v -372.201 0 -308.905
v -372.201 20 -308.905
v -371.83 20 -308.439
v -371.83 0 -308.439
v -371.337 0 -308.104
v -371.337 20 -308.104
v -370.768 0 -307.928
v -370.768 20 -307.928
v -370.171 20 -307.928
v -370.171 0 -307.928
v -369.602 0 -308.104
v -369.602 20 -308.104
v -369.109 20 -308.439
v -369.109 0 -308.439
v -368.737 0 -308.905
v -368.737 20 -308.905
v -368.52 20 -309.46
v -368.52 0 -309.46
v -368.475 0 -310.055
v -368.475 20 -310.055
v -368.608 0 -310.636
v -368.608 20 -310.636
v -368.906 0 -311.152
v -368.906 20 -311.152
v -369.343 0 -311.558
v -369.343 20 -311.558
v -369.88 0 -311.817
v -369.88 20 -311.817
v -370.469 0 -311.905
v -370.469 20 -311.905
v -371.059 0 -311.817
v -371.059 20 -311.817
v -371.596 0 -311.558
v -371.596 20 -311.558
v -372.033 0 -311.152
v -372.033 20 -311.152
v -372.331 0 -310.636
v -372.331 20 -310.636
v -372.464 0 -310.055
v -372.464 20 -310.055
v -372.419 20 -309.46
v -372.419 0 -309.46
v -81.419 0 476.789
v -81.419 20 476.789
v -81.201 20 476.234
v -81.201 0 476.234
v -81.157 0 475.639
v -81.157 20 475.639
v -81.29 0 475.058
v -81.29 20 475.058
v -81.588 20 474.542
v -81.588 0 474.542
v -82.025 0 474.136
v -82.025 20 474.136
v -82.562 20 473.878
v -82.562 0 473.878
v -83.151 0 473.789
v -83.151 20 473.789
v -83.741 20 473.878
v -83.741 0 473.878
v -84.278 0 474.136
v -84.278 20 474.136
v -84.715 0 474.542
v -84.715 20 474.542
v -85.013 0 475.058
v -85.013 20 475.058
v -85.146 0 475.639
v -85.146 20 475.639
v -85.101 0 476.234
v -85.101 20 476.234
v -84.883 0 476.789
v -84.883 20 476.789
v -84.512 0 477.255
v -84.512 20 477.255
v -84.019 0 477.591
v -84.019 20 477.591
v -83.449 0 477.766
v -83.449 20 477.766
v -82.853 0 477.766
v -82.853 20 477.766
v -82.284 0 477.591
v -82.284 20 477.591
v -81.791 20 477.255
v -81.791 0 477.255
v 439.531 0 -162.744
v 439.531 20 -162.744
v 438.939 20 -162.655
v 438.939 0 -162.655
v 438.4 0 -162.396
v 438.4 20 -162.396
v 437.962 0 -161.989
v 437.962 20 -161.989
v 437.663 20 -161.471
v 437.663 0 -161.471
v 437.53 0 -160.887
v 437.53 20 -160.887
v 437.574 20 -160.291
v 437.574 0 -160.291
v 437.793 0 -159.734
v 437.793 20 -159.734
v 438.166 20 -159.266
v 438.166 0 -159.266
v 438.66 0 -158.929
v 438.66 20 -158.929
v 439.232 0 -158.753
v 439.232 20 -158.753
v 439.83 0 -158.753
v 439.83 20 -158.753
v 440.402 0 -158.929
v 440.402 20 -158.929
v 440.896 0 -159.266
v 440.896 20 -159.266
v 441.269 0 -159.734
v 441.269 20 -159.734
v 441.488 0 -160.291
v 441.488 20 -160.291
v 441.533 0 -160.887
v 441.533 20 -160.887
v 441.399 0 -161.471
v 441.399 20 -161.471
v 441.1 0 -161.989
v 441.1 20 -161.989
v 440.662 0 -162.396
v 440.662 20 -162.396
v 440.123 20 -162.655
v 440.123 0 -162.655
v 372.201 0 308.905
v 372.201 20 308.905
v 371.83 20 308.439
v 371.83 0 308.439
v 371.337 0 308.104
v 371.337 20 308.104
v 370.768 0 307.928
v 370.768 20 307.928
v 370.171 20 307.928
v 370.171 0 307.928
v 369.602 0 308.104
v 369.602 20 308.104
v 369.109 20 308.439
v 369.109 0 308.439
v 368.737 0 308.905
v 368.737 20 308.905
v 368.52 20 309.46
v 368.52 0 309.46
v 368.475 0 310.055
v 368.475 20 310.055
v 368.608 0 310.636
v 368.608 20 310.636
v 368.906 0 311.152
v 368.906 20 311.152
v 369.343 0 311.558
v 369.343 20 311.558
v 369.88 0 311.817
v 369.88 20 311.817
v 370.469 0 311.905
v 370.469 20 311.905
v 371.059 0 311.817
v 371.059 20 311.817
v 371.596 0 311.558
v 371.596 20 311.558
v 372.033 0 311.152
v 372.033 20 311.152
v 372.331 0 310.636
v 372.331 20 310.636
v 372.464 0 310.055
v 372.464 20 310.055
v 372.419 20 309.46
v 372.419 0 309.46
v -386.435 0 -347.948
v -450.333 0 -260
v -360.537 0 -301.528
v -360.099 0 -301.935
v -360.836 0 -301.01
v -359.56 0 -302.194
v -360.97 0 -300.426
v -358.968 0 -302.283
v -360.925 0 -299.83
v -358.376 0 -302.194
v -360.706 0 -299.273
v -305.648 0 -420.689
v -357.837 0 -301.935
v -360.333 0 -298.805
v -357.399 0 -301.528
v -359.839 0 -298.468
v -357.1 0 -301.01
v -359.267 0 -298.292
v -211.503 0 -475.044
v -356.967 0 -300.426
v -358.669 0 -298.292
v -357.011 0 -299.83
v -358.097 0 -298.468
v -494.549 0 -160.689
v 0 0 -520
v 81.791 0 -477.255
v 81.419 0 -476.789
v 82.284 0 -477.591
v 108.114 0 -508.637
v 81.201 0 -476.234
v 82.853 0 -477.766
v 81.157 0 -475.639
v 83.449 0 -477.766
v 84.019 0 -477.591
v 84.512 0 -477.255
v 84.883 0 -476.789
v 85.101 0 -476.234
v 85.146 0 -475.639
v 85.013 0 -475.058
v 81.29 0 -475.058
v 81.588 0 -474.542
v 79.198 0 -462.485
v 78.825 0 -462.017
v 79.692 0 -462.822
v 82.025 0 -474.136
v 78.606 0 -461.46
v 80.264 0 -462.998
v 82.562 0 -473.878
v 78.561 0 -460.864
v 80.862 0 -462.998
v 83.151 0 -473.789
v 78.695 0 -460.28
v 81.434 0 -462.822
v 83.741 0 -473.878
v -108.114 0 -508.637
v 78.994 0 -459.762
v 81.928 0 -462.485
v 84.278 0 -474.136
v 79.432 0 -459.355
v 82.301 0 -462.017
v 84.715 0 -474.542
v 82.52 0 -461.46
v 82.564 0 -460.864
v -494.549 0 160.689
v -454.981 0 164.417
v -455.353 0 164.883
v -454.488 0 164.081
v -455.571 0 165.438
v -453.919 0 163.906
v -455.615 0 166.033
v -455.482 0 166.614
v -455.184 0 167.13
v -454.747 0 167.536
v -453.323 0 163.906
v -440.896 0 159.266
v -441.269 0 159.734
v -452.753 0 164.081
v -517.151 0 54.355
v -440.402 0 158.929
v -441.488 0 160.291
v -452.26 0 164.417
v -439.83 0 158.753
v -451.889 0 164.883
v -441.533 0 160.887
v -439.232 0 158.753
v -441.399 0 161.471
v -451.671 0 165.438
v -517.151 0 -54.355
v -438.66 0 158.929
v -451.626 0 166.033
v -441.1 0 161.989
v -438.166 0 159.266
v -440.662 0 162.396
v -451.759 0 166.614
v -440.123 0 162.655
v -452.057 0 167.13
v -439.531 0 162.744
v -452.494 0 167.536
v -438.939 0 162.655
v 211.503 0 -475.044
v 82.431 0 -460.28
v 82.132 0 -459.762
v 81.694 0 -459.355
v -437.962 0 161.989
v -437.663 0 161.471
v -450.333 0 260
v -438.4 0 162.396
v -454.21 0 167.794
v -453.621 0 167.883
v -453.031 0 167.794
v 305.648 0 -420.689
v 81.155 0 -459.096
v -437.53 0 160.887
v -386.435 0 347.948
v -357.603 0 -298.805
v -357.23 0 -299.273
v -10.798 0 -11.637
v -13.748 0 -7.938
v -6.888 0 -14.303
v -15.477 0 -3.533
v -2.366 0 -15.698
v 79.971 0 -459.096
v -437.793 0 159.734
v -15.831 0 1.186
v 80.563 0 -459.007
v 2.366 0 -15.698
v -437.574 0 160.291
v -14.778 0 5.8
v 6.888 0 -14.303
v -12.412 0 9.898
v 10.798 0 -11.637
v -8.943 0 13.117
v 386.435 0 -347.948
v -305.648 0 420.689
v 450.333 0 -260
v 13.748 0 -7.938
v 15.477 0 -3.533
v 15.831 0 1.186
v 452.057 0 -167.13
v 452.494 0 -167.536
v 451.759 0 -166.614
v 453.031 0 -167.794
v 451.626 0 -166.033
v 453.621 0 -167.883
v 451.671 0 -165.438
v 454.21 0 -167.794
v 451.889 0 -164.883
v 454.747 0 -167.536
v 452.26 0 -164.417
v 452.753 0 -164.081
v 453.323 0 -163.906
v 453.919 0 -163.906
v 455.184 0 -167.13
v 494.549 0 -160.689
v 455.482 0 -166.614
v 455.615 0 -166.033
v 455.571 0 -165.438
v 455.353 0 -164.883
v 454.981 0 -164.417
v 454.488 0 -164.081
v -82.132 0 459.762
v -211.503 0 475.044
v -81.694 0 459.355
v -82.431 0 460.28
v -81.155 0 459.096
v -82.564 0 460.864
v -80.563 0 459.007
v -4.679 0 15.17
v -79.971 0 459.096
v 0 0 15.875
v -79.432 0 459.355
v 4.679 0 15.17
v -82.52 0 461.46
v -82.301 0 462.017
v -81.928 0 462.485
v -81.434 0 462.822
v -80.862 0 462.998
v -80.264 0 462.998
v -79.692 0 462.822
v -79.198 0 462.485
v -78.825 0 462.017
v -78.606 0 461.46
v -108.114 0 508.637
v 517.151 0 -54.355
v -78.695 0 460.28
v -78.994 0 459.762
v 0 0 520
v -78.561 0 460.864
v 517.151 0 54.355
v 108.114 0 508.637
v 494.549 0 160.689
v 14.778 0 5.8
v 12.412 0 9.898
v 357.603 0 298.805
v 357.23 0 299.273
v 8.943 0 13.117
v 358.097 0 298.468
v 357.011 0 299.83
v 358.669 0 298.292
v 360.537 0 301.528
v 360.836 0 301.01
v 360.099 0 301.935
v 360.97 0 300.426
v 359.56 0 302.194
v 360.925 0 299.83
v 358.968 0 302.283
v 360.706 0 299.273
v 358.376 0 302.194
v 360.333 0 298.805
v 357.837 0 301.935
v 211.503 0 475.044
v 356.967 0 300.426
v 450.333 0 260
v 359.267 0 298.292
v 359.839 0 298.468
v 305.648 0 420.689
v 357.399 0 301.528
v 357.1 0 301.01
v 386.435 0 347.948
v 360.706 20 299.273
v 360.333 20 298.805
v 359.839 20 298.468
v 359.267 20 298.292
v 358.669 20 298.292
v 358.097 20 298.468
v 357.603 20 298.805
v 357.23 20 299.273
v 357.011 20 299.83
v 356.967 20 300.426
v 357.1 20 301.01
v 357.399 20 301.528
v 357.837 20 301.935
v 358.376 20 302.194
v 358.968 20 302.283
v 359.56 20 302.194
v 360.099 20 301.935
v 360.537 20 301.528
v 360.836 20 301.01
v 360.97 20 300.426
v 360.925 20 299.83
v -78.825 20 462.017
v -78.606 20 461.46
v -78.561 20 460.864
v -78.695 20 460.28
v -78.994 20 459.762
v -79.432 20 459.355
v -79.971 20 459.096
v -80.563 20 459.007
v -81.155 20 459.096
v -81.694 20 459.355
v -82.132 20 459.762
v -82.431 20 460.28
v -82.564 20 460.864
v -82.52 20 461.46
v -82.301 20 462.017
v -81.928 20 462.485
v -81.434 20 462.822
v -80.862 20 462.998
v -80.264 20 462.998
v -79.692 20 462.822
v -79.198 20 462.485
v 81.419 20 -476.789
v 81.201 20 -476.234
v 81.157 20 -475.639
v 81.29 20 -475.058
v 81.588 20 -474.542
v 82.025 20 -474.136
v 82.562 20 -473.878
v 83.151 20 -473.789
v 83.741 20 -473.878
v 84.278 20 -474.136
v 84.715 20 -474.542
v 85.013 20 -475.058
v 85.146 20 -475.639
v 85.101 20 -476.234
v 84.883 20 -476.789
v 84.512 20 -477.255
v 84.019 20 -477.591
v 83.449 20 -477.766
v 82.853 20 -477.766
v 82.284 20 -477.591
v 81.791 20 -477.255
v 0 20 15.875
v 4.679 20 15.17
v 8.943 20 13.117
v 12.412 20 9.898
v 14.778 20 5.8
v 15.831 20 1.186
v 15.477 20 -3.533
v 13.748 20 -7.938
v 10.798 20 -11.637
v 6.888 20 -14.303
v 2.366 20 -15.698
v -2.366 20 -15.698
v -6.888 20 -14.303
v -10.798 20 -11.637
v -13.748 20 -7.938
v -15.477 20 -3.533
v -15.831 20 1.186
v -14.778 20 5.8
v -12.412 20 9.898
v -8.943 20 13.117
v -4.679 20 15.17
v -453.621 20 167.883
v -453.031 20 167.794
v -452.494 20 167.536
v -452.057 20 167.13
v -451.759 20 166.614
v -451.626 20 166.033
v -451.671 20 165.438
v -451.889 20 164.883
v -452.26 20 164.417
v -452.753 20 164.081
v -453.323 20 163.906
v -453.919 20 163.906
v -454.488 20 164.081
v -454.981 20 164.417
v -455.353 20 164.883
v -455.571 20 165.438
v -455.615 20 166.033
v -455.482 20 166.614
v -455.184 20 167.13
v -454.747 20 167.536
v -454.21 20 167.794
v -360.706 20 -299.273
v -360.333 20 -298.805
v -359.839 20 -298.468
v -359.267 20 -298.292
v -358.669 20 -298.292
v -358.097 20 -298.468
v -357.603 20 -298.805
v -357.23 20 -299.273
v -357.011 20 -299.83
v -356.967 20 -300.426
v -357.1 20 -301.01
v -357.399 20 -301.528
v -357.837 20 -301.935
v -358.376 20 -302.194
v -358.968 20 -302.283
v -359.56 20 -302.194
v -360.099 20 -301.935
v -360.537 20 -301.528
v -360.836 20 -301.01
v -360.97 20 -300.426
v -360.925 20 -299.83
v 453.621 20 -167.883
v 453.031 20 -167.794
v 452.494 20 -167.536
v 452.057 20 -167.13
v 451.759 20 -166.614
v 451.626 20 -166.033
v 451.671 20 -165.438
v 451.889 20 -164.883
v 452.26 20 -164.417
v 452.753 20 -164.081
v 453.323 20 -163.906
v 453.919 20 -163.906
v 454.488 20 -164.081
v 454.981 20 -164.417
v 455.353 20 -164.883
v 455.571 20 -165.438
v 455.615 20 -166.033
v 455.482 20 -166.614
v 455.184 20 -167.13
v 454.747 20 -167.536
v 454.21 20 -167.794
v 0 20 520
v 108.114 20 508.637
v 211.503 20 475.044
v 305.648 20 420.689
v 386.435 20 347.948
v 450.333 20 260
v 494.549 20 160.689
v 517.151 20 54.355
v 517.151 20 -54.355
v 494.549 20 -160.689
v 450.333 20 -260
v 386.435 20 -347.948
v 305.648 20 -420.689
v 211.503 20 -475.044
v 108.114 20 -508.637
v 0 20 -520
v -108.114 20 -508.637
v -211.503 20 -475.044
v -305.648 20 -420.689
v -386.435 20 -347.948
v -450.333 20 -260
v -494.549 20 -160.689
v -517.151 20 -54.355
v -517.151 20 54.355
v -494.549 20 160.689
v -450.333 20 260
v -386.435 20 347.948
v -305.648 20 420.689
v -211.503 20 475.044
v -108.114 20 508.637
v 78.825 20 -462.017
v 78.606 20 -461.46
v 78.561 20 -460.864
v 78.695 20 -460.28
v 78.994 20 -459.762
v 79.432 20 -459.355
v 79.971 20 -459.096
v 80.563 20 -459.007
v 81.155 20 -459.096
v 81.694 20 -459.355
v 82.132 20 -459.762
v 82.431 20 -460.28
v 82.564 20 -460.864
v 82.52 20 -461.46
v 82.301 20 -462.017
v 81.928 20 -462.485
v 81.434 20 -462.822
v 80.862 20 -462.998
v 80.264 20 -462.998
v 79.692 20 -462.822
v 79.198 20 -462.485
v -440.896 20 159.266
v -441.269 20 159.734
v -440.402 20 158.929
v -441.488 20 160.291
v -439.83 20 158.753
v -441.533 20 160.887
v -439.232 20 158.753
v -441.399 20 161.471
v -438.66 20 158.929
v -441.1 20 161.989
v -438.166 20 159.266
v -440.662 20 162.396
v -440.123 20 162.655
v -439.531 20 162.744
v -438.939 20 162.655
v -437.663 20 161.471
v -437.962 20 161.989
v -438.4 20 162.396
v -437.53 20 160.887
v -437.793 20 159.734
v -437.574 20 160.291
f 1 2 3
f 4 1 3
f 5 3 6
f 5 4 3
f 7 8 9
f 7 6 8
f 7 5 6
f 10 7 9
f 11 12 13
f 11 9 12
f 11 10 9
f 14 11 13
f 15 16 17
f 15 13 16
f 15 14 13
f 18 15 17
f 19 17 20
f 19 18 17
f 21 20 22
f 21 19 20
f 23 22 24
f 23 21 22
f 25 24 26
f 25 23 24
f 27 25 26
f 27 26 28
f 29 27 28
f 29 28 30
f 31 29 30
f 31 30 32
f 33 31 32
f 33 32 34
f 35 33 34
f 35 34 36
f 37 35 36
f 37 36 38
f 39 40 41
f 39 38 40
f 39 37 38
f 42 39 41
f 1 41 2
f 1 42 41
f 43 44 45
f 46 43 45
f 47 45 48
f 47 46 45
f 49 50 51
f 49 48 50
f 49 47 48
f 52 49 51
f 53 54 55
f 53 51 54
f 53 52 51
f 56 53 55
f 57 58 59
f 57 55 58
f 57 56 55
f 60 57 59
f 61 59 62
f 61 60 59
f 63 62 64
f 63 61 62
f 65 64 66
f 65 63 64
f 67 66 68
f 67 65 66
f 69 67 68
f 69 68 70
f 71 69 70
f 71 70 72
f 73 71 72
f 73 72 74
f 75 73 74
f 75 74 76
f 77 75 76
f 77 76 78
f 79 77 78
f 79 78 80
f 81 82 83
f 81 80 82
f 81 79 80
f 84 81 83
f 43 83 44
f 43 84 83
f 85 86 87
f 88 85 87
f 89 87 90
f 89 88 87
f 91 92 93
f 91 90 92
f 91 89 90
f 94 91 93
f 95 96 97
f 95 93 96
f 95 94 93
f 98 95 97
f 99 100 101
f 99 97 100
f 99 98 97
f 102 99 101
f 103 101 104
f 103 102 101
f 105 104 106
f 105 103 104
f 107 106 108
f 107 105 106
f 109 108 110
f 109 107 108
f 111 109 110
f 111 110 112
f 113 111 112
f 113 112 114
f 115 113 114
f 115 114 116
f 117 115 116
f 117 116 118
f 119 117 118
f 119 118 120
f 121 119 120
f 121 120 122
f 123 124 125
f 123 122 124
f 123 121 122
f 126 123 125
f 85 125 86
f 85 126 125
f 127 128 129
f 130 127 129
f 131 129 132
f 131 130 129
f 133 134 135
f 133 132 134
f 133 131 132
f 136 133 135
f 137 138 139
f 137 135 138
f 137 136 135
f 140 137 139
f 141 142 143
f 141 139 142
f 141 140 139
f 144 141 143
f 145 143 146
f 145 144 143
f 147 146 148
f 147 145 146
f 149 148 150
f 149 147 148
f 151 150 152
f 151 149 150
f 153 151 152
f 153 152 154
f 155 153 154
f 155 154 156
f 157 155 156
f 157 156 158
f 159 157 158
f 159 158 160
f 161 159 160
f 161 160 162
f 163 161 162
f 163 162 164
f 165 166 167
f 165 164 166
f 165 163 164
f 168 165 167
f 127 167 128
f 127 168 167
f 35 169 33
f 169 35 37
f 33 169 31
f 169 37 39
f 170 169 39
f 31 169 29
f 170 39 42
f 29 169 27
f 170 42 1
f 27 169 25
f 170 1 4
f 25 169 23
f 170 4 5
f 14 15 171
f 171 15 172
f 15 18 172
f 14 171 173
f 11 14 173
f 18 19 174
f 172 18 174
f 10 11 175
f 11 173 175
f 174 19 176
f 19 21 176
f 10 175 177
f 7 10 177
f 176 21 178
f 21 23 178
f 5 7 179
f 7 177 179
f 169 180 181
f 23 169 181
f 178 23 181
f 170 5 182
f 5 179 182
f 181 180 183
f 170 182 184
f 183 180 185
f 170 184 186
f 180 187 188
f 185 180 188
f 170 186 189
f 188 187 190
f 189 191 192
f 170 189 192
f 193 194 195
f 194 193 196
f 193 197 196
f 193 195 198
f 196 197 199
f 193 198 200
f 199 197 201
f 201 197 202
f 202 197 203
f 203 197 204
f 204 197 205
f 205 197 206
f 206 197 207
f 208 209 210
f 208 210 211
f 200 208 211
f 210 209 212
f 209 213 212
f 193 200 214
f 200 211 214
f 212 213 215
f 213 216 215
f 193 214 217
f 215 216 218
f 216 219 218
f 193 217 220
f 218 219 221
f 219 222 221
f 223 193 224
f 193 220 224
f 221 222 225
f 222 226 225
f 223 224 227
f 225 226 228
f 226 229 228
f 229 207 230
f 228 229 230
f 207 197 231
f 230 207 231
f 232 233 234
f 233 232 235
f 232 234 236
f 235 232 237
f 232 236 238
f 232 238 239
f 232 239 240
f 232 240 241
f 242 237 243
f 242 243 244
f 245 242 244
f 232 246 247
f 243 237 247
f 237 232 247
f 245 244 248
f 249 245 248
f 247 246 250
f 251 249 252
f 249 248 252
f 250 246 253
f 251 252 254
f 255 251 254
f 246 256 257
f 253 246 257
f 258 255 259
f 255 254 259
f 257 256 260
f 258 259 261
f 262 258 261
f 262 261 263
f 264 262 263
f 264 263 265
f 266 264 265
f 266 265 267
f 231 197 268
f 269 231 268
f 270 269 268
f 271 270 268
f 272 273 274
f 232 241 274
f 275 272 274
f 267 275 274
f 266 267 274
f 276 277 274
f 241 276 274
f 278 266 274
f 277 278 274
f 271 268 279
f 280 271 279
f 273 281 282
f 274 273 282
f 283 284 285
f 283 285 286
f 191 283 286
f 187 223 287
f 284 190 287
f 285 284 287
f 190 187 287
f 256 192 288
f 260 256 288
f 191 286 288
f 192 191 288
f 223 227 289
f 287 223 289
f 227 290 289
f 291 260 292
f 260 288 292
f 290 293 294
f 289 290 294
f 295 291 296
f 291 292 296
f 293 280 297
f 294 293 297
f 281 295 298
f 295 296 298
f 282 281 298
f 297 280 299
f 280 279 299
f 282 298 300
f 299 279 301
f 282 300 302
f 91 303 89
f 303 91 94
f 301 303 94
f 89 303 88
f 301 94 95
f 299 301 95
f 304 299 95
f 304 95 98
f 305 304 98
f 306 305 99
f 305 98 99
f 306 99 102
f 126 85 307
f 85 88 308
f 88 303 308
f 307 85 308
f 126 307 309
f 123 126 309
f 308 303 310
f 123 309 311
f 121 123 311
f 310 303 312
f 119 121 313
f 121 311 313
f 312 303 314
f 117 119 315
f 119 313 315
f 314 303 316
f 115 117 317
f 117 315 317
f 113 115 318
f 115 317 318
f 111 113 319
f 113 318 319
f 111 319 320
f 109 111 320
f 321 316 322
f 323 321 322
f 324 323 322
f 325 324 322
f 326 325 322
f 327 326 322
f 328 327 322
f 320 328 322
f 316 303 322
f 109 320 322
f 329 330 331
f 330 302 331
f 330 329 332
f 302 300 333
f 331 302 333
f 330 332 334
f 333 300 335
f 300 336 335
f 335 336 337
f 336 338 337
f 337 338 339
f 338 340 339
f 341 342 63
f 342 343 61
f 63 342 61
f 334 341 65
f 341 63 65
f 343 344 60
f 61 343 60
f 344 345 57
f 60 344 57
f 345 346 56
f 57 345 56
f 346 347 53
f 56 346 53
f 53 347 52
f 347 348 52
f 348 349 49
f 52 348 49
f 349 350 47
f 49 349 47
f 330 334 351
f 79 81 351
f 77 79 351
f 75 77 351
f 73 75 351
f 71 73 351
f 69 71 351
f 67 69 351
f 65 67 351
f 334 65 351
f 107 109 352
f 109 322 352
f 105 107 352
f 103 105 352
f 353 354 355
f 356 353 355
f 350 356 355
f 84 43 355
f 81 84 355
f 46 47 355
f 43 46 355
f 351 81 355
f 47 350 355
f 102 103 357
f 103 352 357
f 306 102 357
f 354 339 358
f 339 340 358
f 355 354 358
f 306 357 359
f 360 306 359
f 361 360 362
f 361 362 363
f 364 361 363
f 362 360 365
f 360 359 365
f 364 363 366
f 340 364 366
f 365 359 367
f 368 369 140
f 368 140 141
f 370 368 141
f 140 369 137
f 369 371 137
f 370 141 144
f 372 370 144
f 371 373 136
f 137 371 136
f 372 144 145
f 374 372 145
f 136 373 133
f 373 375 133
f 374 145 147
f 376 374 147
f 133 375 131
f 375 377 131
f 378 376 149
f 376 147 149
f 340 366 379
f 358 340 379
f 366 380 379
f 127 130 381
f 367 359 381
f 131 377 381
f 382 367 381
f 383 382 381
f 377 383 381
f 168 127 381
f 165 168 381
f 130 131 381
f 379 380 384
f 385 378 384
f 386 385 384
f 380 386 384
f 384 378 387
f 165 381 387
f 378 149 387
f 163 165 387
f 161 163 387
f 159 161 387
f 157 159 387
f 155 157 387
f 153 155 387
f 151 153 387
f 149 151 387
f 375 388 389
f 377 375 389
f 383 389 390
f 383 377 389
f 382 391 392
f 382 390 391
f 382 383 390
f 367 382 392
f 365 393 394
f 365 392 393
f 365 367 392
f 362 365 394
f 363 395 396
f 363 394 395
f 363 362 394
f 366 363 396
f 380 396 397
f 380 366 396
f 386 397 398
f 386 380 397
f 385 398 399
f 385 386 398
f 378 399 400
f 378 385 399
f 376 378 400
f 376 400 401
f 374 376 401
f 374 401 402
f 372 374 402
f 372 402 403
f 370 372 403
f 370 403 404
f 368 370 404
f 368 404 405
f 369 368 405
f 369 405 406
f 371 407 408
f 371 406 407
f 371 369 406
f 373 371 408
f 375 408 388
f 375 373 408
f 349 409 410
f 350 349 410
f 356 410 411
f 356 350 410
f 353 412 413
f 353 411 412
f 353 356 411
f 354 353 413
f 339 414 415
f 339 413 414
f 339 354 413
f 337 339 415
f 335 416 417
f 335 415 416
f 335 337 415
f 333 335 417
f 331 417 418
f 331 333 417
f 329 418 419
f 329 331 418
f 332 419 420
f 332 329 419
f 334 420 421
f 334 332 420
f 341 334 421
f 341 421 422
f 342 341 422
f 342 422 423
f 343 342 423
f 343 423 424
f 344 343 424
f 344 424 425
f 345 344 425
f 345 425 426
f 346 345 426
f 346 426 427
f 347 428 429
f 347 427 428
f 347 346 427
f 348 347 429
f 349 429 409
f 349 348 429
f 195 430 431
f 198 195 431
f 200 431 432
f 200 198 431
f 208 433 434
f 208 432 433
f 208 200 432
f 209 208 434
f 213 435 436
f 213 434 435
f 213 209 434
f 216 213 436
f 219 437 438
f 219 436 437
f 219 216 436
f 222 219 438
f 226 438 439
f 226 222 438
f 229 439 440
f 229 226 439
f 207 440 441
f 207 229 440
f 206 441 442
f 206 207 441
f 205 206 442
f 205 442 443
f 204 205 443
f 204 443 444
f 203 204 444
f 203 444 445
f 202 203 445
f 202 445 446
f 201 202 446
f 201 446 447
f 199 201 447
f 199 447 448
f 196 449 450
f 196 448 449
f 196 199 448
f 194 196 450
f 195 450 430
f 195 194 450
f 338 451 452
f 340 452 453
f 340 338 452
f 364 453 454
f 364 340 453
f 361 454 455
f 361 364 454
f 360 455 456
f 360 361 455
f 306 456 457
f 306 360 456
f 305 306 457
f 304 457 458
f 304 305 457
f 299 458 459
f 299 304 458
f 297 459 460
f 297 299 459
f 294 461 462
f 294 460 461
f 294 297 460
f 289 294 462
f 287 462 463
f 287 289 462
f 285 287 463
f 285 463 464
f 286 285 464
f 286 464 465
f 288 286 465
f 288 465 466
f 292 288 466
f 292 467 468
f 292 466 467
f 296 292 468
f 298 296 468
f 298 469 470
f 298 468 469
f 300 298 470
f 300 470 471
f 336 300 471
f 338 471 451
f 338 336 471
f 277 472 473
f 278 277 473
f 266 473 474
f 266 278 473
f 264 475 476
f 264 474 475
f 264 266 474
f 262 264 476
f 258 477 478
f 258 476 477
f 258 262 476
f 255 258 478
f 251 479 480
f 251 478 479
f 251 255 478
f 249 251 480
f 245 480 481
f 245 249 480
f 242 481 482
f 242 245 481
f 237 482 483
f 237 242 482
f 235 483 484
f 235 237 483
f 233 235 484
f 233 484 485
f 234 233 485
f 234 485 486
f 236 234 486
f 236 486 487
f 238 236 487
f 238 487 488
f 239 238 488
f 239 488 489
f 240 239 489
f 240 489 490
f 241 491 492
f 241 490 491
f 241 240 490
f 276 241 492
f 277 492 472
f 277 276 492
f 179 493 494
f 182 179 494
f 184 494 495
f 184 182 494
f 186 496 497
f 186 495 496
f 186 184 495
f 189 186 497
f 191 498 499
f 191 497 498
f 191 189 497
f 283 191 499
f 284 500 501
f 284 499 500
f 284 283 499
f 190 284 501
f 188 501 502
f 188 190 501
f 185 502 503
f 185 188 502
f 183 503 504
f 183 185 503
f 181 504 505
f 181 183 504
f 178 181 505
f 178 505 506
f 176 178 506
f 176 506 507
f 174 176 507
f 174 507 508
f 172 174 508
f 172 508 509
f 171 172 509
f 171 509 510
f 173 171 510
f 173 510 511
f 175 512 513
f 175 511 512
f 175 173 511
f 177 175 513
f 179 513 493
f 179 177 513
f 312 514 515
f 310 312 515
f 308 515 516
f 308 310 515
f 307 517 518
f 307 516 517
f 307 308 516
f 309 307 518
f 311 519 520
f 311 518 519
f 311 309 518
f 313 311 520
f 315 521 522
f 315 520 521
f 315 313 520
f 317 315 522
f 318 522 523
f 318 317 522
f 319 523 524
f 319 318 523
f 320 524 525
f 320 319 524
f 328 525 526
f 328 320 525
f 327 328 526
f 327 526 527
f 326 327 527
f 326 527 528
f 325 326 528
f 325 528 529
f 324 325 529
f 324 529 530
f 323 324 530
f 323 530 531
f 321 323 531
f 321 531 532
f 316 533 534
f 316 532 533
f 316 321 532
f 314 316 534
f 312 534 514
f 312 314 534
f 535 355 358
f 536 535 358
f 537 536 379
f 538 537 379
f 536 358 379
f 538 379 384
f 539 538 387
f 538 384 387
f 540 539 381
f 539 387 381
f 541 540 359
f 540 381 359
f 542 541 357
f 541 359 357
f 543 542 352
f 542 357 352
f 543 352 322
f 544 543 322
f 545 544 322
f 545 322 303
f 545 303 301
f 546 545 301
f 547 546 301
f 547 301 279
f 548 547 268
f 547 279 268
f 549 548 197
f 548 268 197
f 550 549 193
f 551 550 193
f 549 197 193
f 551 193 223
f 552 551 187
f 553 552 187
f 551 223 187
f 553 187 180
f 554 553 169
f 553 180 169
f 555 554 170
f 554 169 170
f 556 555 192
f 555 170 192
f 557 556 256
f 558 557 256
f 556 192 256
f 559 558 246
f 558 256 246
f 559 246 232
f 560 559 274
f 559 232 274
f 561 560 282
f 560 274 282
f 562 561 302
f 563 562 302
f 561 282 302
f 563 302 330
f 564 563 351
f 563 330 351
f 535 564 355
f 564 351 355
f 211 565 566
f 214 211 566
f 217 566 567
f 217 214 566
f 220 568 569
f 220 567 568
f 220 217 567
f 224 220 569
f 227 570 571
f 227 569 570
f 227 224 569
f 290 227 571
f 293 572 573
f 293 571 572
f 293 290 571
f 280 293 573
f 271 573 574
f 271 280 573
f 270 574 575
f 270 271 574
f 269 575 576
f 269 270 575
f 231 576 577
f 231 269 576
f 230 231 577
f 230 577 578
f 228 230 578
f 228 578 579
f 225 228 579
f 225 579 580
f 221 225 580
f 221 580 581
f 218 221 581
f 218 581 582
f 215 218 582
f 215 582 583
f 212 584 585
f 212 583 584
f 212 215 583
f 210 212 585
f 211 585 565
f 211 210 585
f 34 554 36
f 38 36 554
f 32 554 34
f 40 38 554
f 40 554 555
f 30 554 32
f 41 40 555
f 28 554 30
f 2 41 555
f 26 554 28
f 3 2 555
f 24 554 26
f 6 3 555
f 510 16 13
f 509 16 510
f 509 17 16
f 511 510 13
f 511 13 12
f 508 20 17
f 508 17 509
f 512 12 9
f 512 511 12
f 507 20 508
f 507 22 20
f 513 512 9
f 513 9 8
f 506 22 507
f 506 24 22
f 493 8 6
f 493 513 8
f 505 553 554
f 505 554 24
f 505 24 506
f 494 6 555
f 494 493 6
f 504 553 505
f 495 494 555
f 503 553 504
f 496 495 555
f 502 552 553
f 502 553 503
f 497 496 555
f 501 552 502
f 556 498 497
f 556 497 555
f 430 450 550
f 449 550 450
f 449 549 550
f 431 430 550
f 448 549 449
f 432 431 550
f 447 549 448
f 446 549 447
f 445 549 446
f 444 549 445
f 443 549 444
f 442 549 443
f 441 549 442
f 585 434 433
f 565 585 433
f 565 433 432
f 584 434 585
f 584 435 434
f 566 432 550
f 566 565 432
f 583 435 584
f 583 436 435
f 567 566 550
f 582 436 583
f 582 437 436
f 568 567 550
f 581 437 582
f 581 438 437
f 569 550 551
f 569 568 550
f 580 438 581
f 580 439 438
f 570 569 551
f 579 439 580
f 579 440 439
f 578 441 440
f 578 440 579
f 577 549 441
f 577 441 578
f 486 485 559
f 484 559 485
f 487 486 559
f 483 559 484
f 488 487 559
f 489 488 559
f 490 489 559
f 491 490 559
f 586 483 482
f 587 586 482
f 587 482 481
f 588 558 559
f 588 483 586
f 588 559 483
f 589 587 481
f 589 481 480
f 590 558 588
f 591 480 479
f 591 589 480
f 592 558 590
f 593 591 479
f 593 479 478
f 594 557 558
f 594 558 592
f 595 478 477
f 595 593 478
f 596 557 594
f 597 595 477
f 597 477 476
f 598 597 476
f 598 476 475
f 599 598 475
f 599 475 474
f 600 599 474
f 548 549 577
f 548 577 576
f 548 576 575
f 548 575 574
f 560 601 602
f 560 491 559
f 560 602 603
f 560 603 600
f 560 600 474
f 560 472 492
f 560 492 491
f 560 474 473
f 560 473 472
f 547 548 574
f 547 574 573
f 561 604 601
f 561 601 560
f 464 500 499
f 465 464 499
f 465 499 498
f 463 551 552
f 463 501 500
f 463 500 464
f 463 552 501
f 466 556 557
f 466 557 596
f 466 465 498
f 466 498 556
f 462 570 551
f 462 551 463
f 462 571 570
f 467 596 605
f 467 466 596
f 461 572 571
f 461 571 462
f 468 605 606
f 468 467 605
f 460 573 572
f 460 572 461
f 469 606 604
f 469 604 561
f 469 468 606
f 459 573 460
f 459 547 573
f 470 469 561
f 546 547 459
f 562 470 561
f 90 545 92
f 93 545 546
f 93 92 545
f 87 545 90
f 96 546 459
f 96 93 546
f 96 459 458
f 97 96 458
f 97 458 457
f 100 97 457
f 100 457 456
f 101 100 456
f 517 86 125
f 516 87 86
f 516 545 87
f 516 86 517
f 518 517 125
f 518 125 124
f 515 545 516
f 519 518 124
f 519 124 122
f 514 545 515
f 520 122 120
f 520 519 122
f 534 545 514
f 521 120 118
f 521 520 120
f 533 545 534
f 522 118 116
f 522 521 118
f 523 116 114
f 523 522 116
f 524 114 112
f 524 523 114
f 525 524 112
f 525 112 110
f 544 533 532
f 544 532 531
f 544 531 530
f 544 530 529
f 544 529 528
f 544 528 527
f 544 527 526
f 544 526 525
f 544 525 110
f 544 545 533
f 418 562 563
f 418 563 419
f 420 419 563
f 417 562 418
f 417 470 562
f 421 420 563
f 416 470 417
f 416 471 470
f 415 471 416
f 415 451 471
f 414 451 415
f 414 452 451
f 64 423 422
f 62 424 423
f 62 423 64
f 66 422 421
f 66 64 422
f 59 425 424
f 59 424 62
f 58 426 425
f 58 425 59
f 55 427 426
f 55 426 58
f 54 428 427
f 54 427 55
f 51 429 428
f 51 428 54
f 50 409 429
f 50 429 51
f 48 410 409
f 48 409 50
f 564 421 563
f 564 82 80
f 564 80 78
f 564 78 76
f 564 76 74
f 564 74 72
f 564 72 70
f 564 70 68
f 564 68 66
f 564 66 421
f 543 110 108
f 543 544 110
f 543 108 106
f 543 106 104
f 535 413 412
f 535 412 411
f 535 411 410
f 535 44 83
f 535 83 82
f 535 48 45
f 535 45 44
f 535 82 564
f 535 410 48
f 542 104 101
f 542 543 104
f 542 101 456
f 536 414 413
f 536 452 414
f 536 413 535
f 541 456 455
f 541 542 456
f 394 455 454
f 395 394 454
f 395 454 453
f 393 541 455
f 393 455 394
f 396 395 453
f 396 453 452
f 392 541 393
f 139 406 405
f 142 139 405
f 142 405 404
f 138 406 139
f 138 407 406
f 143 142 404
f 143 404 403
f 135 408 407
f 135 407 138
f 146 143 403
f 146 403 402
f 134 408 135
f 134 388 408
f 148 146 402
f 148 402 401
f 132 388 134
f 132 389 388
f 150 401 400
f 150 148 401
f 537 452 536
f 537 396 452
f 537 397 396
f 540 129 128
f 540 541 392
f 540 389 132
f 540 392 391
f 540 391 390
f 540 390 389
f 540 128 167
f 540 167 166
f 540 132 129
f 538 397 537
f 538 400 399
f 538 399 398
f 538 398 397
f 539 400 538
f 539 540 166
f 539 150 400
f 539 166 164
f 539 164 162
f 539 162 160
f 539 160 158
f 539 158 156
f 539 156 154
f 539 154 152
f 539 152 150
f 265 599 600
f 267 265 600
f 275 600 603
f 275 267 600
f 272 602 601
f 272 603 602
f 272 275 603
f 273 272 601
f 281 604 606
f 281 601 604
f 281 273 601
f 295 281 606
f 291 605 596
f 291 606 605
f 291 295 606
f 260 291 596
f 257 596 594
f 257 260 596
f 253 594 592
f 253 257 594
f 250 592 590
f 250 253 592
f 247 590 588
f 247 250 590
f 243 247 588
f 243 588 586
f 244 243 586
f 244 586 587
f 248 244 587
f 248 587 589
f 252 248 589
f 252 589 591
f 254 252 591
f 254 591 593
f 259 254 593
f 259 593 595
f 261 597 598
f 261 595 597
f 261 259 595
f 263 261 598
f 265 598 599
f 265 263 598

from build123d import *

# Parameters (mm, degrees)
SKETCH1_R           = 520
BOSS_EXTRUDE2_DEPTH = 20
CUT_EXTRUDE2_START  = -80
SKETCH5_R           = 15.875
SKETCH5_R_2         = 2.007091202
SKETCH5_R_3         = 2
CUT_EXTRUDE2_DEPTH  = 151
CIRPATTERN6_COUNT   = 6


with BuildPart() as part:
    # Sketch1 → Boss-Extrude2 (new body)
    with BuildSketch(Plane(origin=(0, 0, 0), x_dir=(1, 0, 0), z_dir=(0, 1, 0))):
        with Locations(Location((0, 0, 0), (0, 0, 270))):
            Circle(SKETCH1_R)
    extrude(amount=BOSS_EXTRUDE2_DEPTH)

    # Sketch5 → Cut-Extrude2 (cut)
    with BuildSketch(Plane(origin=(0, 20, 0), x_dir=(1, 0, 0), z_dir=(0, 1, 0)).offset(CUT_EXTRUDE2_START)):
        with Locations(Location((0, 0, 0), (0, 0, 270))):
            Circle(SKETCH5_R)
        with Locations(Location((-439.5310312, -160.737278228, 0), (0, 0, 270))):
            Circle(SKETCH5_R_2)
        with Locations(Location((-453.620726539, -165.883197509, 0), (0, 0, 270))):
            Circle(SKETCH5_R_3)
    cut_extrude2 = extrude(amount=CUT_EXTRUDE2_DEPTH, mode=Mode.SUBTRACT)

    # CirPattern6: Cut-Extrude2 ×6 about axis
    cirpattern6_axis = Axis((0, 0, 0), (0, 1, 0))
    for i in range(1, CIRPATTERN6_COUNT):
        add(cut_extrude2.rotate(cirpattern6_axis, i * 360 / CIRPATTERN6_COUNT), mode=Mode.SUBTRACT)


solid = part.part
